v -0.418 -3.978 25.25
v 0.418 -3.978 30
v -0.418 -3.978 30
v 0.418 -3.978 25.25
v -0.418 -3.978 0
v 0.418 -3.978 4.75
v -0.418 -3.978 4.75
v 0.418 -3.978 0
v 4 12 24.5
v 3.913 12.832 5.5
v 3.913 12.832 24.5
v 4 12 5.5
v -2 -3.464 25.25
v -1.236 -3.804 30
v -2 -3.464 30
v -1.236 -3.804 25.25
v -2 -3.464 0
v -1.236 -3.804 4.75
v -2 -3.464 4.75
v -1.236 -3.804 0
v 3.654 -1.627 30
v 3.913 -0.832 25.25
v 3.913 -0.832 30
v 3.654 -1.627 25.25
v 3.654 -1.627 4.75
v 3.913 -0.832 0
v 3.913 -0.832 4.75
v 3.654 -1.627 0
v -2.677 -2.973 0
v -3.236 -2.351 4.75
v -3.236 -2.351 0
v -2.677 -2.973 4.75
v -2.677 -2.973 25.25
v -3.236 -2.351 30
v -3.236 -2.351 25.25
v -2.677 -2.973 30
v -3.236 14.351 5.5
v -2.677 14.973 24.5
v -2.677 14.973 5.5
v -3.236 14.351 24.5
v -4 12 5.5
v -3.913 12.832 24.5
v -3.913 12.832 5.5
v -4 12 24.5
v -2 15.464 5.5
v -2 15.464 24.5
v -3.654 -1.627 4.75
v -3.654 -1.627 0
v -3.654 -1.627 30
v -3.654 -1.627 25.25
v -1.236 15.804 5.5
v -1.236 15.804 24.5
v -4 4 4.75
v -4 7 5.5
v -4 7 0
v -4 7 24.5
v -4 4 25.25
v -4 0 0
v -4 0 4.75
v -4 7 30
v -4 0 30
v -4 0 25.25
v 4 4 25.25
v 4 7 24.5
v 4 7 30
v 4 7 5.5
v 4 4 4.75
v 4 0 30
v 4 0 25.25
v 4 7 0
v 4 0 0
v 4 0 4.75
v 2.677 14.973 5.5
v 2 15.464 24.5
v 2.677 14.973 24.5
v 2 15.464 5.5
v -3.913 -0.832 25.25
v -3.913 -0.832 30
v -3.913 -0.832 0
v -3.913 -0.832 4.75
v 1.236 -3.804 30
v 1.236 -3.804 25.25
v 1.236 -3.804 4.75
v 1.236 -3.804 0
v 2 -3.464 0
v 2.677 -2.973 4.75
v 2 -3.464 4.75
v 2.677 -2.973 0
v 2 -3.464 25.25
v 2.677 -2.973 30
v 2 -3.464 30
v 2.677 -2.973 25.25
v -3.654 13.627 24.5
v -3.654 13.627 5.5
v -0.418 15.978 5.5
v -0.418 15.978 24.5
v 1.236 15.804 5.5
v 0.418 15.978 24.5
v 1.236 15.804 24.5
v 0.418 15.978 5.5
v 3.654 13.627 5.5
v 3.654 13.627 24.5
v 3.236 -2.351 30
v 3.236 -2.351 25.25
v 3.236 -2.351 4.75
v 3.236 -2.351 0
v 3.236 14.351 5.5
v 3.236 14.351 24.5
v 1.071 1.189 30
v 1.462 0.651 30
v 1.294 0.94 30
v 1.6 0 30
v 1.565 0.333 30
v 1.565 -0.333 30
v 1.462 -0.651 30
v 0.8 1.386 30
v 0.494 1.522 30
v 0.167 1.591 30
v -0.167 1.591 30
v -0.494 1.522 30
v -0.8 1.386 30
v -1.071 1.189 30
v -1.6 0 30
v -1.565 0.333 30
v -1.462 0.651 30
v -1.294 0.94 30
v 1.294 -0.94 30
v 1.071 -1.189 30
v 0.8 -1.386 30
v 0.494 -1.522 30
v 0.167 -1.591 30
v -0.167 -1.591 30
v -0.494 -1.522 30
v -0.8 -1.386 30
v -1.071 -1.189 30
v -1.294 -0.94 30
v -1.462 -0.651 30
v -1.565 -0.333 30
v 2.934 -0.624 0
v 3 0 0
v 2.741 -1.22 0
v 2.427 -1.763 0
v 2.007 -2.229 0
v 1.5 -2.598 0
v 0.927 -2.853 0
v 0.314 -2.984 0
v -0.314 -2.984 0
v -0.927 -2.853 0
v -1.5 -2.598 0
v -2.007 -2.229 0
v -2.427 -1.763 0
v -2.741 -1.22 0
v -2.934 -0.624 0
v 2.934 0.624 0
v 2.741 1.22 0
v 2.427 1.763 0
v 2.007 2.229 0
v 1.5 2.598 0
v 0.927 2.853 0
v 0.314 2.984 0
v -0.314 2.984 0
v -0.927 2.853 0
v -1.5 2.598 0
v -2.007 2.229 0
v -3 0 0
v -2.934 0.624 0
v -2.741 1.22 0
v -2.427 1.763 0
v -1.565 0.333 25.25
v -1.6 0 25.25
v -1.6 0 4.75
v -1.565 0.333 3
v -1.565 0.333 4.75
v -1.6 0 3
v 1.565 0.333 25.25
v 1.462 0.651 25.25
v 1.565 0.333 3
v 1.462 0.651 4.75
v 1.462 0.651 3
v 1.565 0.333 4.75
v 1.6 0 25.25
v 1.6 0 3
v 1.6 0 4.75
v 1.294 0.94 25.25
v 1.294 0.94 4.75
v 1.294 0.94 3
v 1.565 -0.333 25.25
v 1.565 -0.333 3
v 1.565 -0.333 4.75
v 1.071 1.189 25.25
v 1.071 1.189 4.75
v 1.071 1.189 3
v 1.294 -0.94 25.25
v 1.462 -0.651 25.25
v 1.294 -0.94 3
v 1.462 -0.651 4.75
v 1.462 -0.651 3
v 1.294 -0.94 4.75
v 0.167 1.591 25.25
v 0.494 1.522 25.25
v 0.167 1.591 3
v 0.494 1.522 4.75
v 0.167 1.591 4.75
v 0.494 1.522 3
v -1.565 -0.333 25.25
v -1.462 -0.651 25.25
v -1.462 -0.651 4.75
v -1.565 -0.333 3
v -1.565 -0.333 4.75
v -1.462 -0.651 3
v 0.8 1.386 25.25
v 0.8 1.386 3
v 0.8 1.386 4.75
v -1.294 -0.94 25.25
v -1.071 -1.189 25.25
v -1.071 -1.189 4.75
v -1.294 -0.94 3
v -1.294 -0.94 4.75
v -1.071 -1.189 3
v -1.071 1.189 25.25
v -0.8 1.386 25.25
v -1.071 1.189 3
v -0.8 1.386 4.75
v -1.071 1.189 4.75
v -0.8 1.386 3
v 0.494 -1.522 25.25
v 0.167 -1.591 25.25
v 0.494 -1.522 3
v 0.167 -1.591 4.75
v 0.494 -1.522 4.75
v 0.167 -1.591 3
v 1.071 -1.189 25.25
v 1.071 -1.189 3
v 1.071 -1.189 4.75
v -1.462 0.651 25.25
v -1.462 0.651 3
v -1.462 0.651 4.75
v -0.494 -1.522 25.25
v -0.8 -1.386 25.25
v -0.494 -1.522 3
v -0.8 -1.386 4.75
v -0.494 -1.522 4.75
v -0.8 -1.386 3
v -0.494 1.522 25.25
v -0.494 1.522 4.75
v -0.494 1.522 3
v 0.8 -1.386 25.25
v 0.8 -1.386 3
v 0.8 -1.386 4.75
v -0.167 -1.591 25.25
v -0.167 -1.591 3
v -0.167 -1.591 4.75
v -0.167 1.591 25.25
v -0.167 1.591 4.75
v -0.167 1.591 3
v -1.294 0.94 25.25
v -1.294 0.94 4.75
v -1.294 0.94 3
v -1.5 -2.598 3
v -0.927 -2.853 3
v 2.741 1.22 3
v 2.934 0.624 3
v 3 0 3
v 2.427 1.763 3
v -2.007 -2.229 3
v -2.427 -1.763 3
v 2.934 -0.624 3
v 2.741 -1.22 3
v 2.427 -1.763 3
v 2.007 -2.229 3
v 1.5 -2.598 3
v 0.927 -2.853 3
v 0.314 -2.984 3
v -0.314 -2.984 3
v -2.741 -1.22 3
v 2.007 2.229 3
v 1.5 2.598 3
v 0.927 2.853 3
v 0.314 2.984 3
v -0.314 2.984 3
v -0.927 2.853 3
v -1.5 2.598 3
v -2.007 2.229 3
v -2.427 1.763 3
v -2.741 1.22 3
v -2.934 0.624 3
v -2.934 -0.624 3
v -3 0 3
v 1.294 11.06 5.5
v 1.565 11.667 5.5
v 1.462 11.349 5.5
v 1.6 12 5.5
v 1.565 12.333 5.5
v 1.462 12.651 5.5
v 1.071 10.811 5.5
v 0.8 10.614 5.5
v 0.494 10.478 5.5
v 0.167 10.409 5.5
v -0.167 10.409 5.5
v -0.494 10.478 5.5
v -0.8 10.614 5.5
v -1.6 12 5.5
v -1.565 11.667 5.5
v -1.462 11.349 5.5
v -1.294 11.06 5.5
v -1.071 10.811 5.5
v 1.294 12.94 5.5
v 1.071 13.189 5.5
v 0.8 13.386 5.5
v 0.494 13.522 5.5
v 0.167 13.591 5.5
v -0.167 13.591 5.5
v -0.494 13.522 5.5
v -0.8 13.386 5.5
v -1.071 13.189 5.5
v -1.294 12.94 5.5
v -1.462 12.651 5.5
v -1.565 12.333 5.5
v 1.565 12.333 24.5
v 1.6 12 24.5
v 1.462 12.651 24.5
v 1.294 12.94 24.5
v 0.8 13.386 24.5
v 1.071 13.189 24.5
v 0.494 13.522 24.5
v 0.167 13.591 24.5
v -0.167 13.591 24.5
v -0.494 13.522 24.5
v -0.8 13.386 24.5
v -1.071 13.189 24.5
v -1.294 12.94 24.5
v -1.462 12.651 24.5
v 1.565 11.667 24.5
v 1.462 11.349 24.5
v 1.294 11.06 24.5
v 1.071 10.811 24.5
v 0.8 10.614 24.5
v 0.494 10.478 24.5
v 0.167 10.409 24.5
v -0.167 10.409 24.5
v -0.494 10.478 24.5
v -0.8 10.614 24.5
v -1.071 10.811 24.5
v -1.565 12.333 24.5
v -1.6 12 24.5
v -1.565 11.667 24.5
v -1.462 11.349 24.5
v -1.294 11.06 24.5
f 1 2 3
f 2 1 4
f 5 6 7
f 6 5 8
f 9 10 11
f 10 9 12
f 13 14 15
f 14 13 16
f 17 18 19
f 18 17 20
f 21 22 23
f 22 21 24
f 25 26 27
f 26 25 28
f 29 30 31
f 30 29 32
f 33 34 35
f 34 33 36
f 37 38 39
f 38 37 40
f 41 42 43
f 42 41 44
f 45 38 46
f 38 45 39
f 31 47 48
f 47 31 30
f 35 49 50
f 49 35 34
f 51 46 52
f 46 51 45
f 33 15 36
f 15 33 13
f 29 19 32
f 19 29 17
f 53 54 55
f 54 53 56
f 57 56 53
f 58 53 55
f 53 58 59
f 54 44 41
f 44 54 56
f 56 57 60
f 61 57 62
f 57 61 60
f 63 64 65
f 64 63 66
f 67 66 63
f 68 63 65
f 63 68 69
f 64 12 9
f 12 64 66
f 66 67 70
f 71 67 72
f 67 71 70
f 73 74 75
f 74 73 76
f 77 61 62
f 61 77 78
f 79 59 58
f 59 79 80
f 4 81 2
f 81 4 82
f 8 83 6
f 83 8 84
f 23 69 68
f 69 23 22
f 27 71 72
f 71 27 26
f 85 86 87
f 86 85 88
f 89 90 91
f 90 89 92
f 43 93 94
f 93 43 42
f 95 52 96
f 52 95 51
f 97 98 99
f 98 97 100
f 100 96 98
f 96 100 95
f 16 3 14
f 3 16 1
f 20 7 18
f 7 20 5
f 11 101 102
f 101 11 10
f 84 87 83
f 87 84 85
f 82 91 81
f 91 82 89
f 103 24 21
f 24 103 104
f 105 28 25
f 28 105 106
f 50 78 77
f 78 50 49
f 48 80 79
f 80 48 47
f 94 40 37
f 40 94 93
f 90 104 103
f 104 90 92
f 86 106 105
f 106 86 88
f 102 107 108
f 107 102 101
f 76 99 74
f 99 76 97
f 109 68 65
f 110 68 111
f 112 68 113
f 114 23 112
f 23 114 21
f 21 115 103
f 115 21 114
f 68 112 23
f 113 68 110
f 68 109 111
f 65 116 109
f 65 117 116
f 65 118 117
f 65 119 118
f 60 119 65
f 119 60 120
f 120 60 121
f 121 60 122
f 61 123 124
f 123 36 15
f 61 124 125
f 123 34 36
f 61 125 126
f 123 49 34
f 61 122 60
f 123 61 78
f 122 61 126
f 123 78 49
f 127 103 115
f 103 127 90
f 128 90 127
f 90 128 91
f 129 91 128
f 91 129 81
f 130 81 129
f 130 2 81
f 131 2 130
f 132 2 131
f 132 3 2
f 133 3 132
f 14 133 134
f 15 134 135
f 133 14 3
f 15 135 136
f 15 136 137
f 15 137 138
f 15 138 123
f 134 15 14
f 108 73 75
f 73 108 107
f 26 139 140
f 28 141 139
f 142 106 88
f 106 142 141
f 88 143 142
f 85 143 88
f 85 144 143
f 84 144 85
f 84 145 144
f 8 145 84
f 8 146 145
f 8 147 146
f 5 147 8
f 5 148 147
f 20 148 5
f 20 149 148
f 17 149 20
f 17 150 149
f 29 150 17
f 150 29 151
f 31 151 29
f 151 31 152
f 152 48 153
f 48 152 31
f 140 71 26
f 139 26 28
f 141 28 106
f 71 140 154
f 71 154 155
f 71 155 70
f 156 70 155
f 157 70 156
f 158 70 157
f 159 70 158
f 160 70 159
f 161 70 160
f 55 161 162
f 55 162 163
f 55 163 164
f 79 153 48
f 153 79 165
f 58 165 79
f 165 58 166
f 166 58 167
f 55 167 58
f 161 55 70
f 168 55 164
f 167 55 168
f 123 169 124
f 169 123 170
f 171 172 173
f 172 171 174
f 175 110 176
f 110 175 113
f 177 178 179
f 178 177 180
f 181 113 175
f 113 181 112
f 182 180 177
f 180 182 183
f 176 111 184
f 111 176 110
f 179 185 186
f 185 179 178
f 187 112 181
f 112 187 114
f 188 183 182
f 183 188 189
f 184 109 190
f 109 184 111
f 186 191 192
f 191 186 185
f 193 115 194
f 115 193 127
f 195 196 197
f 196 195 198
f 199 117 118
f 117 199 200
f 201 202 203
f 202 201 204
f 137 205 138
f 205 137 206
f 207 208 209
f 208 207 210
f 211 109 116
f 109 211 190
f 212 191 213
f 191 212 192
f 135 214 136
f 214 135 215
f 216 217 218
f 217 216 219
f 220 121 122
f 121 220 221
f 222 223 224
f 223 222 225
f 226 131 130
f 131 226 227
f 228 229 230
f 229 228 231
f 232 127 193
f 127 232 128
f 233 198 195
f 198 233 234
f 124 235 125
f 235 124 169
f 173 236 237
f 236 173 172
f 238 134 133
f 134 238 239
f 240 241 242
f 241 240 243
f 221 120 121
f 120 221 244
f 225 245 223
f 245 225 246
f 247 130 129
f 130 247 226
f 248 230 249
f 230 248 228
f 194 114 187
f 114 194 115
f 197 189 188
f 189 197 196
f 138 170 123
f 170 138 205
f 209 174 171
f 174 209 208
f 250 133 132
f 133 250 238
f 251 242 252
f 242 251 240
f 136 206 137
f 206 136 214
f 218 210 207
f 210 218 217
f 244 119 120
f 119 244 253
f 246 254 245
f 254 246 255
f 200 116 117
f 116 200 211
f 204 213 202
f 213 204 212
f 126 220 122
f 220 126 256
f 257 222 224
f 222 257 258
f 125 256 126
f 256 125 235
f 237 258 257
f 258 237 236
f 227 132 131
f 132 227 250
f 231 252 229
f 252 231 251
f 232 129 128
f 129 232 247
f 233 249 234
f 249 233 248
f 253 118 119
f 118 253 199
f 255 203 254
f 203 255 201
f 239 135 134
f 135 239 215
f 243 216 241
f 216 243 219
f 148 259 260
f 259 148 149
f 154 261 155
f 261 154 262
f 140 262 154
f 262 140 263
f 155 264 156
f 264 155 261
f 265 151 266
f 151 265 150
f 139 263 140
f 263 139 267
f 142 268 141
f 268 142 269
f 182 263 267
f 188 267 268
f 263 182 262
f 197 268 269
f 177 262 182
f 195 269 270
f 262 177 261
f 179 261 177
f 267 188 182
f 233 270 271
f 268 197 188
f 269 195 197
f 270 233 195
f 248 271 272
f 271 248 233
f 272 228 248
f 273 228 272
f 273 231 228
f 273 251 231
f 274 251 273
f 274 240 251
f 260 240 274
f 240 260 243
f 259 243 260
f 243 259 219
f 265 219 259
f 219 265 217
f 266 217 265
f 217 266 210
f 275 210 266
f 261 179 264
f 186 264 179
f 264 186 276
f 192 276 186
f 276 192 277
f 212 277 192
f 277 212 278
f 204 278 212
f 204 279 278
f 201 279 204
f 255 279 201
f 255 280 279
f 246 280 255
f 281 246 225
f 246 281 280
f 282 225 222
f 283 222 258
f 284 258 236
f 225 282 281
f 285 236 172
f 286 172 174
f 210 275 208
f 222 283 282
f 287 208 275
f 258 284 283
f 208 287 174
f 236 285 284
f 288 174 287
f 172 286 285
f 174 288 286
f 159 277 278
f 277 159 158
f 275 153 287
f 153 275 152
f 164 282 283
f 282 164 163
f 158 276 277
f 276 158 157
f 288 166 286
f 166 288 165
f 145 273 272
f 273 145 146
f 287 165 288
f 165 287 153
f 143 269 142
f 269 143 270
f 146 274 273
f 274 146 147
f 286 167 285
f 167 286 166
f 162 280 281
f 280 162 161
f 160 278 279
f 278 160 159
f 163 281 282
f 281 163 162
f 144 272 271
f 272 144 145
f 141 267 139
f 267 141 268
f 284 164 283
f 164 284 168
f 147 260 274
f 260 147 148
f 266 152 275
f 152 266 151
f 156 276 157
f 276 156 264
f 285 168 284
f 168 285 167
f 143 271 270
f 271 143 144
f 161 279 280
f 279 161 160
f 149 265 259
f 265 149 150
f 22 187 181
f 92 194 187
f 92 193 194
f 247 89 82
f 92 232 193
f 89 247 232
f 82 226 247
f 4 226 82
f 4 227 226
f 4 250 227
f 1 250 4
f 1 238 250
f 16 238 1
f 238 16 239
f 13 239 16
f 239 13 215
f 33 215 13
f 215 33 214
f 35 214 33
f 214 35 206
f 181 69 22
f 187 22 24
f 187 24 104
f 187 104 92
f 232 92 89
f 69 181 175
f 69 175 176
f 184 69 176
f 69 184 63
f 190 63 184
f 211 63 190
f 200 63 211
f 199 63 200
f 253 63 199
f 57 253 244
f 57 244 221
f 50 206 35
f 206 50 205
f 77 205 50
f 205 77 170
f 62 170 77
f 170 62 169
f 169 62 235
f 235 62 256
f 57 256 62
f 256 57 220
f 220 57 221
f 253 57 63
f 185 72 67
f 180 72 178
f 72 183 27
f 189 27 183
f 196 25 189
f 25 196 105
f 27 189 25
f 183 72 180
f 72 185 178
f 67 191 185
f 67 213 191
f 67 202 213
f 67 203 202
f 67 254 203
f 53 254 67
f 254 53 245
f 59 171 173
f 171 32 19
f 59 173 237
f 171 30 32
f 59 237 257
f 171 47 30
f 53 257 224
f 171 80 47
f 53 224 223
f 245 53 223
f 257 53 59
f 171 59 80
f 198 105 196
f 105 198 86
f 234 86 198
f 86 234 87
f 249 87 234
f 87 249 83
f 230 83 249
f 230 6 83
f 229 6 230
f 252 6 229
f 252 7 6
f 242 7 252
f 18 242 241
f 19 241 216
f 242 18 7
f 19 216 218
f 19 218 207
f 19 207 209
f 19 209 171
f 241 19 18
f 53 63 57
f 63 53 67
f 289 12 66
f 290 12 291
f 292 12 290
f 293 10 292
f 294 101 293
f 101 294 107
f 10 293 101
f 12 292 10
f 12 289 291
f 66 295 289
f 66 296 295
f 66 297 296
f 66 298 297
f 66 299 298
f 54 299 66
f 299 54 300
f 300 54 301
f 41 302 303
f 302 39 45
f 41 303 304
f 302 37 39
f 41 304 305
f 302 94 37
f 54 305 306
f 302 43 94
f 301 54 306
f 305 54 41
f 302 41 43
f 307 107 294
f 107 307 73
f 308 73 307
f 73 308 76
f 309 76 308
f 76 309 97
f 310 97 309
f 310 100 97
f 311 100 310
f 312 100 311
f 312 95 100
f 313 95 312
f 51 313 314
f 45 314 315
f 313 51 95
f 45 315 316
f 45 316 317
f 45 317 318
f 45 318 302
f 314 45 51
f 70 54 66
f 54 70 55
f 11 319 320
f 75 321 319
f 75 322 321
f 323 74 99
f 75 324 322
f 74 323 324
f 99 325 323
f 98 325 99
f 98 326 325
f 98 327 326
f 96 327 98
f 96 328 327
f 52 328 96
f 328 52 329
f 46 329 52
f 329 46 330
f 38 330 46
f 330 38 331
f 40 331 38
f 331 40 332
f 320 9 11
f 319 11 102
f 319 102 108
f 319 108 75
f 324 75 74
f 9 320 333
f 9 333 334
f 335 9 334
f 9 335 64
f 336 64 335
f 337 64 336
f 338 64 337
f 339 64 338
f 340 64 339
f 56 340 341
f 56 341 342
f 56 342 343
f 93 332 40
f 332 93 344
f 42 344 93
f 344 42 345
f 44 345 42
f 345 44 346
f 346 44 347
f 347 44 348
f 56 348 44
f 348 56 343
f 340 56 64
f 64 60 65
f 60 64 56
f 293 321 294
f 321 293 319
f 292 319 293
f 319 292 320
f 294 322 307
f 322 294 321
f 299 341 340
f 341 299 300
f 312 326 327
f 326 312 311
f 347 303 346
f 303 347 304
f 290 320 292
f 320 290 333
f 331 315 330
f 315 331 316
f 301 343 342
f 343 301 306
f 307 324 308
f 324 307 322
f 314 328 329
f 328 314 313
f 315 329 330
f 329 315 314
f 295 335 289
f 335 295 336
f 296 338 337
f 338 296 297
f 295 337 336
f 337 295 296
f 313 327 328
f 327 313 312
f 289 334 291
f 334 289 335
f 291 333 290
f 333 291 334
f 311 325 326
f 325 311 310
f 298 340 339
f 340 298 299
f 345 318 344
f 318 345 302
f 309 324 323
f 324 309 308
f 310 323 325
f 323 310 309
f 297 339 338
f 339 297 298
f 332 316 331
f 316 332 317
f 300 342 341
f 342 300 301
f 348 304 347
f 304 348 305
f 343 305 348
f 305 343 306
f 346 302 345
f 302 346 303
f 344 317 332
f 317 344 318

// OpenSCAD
BELT_WIDTH = 20;
FLAP_HEIGHT = 5;
BOLT_DIA = 3.2;
BOLT_HEAD_DIA = 6;
BOLT_HEAD_HEIGHT = 3;

DISTANCE = 12;
DIA = 8;
HEIGHT = BELT_WIDTH + 2 * FLAP_HEIGHT;

$fn = 30;

difference() {
    hull() {
        cylinder(d = DIA, h = HEIGHT);
        translate([0, DISTANCE, 0])
        cylinder(d = DIA, h = HEIGHT);
    }
    cylinder(d = BOLT_DIA, h = HEIGHT);
    cylinder(d = BOLT_HEAD_DIA, h = BOLT_HEAD_HEIGHT);

    translate([-DIA/2, -DIA/2, FLAP_HEIGHT - 0.25])
    cube(size = [DIA, DIA, BELT_WIDTH + 0.5]);

    d = (DISTANCE + DIA)/2;
    translate([-d/2, DISTANCE - d/2, 0])
    cube(size = [d, d, FLAP_HEIGHT + 0.5]);

    translate([-d/2, DISTANCE - d/2, HEIGHT - FLAP_HEIGHT - 0.5])
    cube(size = [d, d, FLAP_HEIGHT + 0.5]);

    translate([0, DISTANCE, 0])
    cylinder(d = BOLT_DIA, h = HEIGHT);
}
